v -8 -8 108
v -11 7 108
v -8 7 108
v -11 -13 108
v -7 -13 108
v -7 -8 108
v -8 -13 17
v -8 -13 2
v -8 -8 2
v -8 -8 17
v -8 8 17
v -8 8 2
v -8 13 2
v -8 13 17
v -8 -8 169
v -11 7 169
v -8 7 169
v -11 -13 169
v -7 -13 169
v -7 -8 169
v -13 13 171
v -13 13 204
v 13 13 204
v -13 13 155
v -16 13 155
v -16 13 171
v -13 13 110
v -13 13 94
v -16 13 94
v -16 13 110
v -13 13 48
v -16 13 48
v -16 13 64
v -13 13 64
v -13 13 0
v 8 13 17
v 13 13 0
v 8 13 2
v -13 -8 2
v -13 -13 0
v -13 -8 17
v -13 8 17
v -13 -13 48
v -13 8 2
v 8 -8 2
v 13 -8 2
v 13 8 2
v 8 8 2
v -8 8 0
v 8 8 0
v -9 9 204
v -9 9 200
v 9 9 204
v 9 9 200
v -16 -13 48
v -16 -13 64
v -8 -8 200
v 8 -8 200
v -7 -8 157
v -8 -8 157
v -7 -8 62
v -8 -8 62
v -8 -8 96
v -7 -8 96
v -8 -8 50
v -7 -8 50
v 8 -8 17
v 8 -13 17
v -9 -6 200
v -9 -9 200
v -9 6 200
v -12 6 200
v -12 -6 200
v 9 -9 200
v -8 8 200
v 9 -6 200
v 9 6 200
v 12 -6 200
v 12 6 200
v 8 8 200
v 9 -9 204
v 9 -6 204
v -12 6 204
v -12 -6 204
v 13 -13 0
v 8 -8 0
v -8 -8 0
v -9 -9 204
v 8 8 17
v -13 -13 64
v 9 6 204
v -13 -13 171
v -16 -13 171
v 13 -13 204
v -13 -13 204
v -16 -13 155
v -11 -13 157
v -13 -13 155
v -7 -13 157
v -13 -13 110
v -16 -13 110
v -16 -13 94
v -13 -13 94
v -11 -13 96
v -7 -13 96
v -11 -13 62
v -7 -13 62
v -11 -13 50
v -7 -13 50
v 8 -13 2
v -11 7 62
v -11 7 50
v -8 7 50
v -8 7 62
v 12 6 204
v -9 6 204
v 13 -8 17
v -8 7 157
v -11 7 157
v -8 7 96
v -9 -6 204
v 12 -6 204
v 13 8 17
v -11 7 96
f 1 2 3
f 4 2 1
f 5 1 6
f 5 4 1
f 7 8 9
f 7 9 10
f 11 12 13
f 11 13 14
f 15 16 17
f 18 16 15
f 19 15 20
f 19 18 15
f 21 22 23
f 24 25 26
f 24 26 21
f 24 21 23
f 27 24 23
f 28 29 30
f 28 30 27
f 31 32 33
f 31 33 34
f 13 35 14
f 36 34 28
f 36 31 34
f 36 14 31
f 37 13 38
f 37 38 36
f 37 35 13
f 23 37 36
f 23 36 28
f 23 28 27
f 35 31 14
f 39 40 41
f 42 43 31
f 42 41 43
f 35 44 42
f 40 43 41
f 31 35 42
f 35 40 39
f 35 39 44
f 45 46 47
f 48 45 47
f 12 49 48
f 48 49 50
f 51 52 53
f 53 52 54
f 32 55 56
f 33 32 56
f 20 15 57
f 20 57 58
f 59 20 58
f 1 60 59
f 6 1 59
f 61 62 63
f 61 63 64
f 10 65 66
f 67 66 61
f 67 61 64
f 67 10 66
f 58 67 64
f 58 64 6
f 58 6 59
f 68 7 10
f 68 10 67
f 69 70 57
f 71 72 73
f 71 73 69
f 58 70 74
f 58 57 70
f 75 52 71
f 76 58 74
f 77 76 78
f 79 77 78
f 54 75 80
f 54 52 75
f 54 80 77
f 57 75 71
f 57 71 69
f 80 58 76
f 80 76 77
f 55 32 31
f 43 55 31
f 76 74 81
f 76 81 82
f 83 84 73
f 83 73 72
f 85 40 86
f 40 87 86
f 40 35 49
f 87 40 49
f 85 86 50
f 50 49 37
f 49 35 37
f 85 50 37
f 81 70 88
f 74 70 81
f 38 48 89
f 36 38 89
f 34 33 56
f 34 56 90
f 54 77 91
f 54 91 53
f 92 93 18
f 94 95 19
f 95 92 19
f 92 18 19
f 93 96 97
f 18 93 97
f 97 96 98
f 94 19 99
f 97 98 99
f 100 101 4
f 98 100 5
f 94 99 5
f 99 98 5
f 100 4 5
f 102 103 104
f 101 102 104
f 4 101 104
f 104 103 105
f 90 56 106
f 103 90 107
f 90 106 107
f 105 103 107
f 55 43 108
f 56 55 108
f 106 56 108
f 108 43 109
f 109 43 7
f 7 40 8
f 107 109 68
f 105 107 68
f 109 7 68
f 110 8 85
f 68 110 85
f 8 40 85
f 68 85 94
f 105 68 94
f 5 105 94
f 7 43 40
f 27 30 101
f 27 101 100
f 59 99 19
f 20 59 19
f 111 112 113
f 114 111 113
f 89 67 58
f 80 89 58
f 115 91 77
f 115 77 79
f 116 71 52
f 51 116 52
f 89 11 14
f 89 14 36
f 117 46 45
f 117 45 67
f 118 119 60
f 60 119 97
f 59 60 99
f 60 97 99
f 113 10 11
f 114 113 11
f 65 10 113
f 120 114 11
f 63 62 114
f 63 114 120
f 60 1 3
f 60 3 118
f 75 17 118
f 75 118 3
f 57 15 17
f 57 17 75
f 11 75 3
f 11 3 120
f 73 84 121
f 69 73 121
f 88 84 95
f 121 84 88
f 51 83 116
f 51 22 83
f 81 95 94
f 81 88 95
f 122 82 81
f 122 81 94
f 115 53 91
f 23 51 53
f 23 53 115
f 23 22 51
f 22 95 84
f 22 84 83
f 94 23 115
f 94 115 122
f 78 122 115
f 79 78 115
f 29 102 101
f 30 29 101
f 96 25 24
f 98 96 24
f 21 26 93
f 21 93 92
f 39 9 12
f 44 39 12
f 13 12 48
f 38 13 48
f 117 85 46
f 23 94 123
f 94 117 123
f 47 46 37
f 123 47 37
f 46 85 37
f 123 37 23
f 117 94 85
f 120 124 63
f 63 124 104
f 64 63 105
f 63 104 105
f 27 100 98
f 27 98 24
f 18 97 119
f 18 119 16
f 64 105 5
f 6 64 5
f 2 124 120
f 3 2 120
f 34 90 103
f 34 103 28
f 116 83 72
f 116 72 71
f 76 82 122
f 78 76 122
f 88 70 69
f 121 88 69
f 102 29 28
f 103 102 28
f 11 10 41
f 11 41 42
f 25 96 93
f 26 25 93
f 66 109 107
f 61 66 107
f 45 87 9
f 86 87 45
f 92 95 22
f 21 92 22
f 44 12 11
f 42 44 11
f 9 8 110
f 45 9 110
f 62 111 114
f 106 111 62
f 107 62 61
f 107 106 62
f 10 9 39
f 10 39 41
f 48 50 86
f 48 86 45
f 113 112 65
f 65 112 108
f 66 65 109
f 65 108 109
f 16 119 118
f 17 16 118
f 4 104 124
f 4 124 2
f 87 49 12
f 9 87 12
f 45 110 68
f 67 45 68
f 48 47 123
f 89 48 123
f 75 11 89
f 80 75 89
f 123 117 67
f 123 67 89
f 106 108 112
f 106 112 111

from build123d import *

# Parameters (mm, degrees)
F0_W      = 26
F0_H      = 26
F0_W_2    = 16
F0_H_2    = 16
F1_DEPTH  = 2
F2_DEPTH  = 200
F3_W      = 26
F3_H      = 26
F3_W_2    = 18
F3_H_2    = 18
F4_DEPTH  = 4
F6_DEPTH  = 25
F7_W      = 3
F7_H      = 16
F8_DEPTH  = 26
F9_W      = 4
F9_H      = 12
F10_DEPTH = 20
F11_W     = 16
F11_H     = 15
F12_DEPTH = 40
F13_W     = 16
F13_H     = 15
F14_DEPTH = 40
F15_W     = 4
F15_H     = 12
F16_DEPTH = 20
F17_W     = 3
F17_H     = 12
F18_DEPTH = 4


with BuildPart() as f1:
    # F0 (on Top) → F1 (new body)
    with BuildSketch(Plane.XY):
        Rectangle(F0_W, F0_H)
        Rectangle(F0_W_2, F0_H_2, mode=Mode.SUBTRACT)
        Rectangle(F0_W_2, F0_H_2)
    extrude(amount=F1_DEPTH)

    # F0 (on Top) → F2 (join)
    with BuildSketch(Plane.XY):
        Rectangle(F0_W, F0_H)
        Rectangle(F0_W_2, F0_H_2, mode=Mode.SUBTRACT)
    extrude(amount=F2_DEPTH)

    # F3 (on face) → F4 (join)
    with BuildSketch(Plane.XY.offset(200)):
        Rectangle(F3_W, F3_H)
        Rectangle(F3_W_2, F3_H_2, mode=Mode.SUBTRACT)
    extrude(amount=F4_DEPTH)

    # F0 (on Top) → F6 (cut)
    with BuildSketch(Plane.XY):
        Rectangle(F0_W_2, F0_H_2)
    extrude(amount=F6_DEPTH, mode=Mode.SUBTRACT)

    # F7 (on face) → F8 (join)
    with BuildSketch(Plane.XZ.offset(13)):
        with Locations((-14.5, 163)):
            Rectangle(F7_W, F7_H)
        with Locations((-14.5, 102)):
            Rectangle(F7_W, F7_H)
        with Locations((-14.5, 56)):
            Rectangle(F7_W, F7_H)
    extrude(amount=-F8_DEPTH)

    # F9 (on face) → F10 (cut)
    with BuildSketch(Plane.XZ.offset(13)):
        with Locations((-9, 163)):
            Rectangle(F9_W, F9_H)
    extrude(amount=-F10_DEPTH, mode=Mode.SUBTRACT)

    # F11 (on face) → F12 (cut)
    with BuildSketch(Plane.XZ.offset(13)):
        with Locations((0, 9.5)):
            Rectangle(F11_W, F11_H)
    extrude(amount=-F12_DEPTH, mode=Mode.SUBTRACT)

    # F13 (on face) → F14 (cut)
    with BuildSketch(Plane.YZ.offset(13)):
        with Locations((0, 9.5)):
            Rectangle(F13_W, F13_H)
    extrude(amount=-F14_DEPTH, mode=Mode.SUBTRACT)

    # F15 (on face) → F16 (cut)
    with BuildSketch(Plane.XZ.offset(13)):
        with Locations((-9, 102)):
            Rectangle(F15_W, F15_H)
        with Locations((-9, 56)):
            Rectangle(F15_W, F15_H)
    extrude(amount=-F16_DEPTH, mode=Mode.SUBTRACT)

    # F17 (on face) → F18 (cut)
    with BuildSketch(Plane.XY.offset(204)):
        with Locations((-10.5, 0)):
            Rectangle(F17_W, F17_H)
        with Locations((10.5, 0)):
            Rectangle(F17_W, F17_H)
    extrude(amount=-F18_DEPTH, mode=Mode.SUBTRACT)


solid = f1.part
